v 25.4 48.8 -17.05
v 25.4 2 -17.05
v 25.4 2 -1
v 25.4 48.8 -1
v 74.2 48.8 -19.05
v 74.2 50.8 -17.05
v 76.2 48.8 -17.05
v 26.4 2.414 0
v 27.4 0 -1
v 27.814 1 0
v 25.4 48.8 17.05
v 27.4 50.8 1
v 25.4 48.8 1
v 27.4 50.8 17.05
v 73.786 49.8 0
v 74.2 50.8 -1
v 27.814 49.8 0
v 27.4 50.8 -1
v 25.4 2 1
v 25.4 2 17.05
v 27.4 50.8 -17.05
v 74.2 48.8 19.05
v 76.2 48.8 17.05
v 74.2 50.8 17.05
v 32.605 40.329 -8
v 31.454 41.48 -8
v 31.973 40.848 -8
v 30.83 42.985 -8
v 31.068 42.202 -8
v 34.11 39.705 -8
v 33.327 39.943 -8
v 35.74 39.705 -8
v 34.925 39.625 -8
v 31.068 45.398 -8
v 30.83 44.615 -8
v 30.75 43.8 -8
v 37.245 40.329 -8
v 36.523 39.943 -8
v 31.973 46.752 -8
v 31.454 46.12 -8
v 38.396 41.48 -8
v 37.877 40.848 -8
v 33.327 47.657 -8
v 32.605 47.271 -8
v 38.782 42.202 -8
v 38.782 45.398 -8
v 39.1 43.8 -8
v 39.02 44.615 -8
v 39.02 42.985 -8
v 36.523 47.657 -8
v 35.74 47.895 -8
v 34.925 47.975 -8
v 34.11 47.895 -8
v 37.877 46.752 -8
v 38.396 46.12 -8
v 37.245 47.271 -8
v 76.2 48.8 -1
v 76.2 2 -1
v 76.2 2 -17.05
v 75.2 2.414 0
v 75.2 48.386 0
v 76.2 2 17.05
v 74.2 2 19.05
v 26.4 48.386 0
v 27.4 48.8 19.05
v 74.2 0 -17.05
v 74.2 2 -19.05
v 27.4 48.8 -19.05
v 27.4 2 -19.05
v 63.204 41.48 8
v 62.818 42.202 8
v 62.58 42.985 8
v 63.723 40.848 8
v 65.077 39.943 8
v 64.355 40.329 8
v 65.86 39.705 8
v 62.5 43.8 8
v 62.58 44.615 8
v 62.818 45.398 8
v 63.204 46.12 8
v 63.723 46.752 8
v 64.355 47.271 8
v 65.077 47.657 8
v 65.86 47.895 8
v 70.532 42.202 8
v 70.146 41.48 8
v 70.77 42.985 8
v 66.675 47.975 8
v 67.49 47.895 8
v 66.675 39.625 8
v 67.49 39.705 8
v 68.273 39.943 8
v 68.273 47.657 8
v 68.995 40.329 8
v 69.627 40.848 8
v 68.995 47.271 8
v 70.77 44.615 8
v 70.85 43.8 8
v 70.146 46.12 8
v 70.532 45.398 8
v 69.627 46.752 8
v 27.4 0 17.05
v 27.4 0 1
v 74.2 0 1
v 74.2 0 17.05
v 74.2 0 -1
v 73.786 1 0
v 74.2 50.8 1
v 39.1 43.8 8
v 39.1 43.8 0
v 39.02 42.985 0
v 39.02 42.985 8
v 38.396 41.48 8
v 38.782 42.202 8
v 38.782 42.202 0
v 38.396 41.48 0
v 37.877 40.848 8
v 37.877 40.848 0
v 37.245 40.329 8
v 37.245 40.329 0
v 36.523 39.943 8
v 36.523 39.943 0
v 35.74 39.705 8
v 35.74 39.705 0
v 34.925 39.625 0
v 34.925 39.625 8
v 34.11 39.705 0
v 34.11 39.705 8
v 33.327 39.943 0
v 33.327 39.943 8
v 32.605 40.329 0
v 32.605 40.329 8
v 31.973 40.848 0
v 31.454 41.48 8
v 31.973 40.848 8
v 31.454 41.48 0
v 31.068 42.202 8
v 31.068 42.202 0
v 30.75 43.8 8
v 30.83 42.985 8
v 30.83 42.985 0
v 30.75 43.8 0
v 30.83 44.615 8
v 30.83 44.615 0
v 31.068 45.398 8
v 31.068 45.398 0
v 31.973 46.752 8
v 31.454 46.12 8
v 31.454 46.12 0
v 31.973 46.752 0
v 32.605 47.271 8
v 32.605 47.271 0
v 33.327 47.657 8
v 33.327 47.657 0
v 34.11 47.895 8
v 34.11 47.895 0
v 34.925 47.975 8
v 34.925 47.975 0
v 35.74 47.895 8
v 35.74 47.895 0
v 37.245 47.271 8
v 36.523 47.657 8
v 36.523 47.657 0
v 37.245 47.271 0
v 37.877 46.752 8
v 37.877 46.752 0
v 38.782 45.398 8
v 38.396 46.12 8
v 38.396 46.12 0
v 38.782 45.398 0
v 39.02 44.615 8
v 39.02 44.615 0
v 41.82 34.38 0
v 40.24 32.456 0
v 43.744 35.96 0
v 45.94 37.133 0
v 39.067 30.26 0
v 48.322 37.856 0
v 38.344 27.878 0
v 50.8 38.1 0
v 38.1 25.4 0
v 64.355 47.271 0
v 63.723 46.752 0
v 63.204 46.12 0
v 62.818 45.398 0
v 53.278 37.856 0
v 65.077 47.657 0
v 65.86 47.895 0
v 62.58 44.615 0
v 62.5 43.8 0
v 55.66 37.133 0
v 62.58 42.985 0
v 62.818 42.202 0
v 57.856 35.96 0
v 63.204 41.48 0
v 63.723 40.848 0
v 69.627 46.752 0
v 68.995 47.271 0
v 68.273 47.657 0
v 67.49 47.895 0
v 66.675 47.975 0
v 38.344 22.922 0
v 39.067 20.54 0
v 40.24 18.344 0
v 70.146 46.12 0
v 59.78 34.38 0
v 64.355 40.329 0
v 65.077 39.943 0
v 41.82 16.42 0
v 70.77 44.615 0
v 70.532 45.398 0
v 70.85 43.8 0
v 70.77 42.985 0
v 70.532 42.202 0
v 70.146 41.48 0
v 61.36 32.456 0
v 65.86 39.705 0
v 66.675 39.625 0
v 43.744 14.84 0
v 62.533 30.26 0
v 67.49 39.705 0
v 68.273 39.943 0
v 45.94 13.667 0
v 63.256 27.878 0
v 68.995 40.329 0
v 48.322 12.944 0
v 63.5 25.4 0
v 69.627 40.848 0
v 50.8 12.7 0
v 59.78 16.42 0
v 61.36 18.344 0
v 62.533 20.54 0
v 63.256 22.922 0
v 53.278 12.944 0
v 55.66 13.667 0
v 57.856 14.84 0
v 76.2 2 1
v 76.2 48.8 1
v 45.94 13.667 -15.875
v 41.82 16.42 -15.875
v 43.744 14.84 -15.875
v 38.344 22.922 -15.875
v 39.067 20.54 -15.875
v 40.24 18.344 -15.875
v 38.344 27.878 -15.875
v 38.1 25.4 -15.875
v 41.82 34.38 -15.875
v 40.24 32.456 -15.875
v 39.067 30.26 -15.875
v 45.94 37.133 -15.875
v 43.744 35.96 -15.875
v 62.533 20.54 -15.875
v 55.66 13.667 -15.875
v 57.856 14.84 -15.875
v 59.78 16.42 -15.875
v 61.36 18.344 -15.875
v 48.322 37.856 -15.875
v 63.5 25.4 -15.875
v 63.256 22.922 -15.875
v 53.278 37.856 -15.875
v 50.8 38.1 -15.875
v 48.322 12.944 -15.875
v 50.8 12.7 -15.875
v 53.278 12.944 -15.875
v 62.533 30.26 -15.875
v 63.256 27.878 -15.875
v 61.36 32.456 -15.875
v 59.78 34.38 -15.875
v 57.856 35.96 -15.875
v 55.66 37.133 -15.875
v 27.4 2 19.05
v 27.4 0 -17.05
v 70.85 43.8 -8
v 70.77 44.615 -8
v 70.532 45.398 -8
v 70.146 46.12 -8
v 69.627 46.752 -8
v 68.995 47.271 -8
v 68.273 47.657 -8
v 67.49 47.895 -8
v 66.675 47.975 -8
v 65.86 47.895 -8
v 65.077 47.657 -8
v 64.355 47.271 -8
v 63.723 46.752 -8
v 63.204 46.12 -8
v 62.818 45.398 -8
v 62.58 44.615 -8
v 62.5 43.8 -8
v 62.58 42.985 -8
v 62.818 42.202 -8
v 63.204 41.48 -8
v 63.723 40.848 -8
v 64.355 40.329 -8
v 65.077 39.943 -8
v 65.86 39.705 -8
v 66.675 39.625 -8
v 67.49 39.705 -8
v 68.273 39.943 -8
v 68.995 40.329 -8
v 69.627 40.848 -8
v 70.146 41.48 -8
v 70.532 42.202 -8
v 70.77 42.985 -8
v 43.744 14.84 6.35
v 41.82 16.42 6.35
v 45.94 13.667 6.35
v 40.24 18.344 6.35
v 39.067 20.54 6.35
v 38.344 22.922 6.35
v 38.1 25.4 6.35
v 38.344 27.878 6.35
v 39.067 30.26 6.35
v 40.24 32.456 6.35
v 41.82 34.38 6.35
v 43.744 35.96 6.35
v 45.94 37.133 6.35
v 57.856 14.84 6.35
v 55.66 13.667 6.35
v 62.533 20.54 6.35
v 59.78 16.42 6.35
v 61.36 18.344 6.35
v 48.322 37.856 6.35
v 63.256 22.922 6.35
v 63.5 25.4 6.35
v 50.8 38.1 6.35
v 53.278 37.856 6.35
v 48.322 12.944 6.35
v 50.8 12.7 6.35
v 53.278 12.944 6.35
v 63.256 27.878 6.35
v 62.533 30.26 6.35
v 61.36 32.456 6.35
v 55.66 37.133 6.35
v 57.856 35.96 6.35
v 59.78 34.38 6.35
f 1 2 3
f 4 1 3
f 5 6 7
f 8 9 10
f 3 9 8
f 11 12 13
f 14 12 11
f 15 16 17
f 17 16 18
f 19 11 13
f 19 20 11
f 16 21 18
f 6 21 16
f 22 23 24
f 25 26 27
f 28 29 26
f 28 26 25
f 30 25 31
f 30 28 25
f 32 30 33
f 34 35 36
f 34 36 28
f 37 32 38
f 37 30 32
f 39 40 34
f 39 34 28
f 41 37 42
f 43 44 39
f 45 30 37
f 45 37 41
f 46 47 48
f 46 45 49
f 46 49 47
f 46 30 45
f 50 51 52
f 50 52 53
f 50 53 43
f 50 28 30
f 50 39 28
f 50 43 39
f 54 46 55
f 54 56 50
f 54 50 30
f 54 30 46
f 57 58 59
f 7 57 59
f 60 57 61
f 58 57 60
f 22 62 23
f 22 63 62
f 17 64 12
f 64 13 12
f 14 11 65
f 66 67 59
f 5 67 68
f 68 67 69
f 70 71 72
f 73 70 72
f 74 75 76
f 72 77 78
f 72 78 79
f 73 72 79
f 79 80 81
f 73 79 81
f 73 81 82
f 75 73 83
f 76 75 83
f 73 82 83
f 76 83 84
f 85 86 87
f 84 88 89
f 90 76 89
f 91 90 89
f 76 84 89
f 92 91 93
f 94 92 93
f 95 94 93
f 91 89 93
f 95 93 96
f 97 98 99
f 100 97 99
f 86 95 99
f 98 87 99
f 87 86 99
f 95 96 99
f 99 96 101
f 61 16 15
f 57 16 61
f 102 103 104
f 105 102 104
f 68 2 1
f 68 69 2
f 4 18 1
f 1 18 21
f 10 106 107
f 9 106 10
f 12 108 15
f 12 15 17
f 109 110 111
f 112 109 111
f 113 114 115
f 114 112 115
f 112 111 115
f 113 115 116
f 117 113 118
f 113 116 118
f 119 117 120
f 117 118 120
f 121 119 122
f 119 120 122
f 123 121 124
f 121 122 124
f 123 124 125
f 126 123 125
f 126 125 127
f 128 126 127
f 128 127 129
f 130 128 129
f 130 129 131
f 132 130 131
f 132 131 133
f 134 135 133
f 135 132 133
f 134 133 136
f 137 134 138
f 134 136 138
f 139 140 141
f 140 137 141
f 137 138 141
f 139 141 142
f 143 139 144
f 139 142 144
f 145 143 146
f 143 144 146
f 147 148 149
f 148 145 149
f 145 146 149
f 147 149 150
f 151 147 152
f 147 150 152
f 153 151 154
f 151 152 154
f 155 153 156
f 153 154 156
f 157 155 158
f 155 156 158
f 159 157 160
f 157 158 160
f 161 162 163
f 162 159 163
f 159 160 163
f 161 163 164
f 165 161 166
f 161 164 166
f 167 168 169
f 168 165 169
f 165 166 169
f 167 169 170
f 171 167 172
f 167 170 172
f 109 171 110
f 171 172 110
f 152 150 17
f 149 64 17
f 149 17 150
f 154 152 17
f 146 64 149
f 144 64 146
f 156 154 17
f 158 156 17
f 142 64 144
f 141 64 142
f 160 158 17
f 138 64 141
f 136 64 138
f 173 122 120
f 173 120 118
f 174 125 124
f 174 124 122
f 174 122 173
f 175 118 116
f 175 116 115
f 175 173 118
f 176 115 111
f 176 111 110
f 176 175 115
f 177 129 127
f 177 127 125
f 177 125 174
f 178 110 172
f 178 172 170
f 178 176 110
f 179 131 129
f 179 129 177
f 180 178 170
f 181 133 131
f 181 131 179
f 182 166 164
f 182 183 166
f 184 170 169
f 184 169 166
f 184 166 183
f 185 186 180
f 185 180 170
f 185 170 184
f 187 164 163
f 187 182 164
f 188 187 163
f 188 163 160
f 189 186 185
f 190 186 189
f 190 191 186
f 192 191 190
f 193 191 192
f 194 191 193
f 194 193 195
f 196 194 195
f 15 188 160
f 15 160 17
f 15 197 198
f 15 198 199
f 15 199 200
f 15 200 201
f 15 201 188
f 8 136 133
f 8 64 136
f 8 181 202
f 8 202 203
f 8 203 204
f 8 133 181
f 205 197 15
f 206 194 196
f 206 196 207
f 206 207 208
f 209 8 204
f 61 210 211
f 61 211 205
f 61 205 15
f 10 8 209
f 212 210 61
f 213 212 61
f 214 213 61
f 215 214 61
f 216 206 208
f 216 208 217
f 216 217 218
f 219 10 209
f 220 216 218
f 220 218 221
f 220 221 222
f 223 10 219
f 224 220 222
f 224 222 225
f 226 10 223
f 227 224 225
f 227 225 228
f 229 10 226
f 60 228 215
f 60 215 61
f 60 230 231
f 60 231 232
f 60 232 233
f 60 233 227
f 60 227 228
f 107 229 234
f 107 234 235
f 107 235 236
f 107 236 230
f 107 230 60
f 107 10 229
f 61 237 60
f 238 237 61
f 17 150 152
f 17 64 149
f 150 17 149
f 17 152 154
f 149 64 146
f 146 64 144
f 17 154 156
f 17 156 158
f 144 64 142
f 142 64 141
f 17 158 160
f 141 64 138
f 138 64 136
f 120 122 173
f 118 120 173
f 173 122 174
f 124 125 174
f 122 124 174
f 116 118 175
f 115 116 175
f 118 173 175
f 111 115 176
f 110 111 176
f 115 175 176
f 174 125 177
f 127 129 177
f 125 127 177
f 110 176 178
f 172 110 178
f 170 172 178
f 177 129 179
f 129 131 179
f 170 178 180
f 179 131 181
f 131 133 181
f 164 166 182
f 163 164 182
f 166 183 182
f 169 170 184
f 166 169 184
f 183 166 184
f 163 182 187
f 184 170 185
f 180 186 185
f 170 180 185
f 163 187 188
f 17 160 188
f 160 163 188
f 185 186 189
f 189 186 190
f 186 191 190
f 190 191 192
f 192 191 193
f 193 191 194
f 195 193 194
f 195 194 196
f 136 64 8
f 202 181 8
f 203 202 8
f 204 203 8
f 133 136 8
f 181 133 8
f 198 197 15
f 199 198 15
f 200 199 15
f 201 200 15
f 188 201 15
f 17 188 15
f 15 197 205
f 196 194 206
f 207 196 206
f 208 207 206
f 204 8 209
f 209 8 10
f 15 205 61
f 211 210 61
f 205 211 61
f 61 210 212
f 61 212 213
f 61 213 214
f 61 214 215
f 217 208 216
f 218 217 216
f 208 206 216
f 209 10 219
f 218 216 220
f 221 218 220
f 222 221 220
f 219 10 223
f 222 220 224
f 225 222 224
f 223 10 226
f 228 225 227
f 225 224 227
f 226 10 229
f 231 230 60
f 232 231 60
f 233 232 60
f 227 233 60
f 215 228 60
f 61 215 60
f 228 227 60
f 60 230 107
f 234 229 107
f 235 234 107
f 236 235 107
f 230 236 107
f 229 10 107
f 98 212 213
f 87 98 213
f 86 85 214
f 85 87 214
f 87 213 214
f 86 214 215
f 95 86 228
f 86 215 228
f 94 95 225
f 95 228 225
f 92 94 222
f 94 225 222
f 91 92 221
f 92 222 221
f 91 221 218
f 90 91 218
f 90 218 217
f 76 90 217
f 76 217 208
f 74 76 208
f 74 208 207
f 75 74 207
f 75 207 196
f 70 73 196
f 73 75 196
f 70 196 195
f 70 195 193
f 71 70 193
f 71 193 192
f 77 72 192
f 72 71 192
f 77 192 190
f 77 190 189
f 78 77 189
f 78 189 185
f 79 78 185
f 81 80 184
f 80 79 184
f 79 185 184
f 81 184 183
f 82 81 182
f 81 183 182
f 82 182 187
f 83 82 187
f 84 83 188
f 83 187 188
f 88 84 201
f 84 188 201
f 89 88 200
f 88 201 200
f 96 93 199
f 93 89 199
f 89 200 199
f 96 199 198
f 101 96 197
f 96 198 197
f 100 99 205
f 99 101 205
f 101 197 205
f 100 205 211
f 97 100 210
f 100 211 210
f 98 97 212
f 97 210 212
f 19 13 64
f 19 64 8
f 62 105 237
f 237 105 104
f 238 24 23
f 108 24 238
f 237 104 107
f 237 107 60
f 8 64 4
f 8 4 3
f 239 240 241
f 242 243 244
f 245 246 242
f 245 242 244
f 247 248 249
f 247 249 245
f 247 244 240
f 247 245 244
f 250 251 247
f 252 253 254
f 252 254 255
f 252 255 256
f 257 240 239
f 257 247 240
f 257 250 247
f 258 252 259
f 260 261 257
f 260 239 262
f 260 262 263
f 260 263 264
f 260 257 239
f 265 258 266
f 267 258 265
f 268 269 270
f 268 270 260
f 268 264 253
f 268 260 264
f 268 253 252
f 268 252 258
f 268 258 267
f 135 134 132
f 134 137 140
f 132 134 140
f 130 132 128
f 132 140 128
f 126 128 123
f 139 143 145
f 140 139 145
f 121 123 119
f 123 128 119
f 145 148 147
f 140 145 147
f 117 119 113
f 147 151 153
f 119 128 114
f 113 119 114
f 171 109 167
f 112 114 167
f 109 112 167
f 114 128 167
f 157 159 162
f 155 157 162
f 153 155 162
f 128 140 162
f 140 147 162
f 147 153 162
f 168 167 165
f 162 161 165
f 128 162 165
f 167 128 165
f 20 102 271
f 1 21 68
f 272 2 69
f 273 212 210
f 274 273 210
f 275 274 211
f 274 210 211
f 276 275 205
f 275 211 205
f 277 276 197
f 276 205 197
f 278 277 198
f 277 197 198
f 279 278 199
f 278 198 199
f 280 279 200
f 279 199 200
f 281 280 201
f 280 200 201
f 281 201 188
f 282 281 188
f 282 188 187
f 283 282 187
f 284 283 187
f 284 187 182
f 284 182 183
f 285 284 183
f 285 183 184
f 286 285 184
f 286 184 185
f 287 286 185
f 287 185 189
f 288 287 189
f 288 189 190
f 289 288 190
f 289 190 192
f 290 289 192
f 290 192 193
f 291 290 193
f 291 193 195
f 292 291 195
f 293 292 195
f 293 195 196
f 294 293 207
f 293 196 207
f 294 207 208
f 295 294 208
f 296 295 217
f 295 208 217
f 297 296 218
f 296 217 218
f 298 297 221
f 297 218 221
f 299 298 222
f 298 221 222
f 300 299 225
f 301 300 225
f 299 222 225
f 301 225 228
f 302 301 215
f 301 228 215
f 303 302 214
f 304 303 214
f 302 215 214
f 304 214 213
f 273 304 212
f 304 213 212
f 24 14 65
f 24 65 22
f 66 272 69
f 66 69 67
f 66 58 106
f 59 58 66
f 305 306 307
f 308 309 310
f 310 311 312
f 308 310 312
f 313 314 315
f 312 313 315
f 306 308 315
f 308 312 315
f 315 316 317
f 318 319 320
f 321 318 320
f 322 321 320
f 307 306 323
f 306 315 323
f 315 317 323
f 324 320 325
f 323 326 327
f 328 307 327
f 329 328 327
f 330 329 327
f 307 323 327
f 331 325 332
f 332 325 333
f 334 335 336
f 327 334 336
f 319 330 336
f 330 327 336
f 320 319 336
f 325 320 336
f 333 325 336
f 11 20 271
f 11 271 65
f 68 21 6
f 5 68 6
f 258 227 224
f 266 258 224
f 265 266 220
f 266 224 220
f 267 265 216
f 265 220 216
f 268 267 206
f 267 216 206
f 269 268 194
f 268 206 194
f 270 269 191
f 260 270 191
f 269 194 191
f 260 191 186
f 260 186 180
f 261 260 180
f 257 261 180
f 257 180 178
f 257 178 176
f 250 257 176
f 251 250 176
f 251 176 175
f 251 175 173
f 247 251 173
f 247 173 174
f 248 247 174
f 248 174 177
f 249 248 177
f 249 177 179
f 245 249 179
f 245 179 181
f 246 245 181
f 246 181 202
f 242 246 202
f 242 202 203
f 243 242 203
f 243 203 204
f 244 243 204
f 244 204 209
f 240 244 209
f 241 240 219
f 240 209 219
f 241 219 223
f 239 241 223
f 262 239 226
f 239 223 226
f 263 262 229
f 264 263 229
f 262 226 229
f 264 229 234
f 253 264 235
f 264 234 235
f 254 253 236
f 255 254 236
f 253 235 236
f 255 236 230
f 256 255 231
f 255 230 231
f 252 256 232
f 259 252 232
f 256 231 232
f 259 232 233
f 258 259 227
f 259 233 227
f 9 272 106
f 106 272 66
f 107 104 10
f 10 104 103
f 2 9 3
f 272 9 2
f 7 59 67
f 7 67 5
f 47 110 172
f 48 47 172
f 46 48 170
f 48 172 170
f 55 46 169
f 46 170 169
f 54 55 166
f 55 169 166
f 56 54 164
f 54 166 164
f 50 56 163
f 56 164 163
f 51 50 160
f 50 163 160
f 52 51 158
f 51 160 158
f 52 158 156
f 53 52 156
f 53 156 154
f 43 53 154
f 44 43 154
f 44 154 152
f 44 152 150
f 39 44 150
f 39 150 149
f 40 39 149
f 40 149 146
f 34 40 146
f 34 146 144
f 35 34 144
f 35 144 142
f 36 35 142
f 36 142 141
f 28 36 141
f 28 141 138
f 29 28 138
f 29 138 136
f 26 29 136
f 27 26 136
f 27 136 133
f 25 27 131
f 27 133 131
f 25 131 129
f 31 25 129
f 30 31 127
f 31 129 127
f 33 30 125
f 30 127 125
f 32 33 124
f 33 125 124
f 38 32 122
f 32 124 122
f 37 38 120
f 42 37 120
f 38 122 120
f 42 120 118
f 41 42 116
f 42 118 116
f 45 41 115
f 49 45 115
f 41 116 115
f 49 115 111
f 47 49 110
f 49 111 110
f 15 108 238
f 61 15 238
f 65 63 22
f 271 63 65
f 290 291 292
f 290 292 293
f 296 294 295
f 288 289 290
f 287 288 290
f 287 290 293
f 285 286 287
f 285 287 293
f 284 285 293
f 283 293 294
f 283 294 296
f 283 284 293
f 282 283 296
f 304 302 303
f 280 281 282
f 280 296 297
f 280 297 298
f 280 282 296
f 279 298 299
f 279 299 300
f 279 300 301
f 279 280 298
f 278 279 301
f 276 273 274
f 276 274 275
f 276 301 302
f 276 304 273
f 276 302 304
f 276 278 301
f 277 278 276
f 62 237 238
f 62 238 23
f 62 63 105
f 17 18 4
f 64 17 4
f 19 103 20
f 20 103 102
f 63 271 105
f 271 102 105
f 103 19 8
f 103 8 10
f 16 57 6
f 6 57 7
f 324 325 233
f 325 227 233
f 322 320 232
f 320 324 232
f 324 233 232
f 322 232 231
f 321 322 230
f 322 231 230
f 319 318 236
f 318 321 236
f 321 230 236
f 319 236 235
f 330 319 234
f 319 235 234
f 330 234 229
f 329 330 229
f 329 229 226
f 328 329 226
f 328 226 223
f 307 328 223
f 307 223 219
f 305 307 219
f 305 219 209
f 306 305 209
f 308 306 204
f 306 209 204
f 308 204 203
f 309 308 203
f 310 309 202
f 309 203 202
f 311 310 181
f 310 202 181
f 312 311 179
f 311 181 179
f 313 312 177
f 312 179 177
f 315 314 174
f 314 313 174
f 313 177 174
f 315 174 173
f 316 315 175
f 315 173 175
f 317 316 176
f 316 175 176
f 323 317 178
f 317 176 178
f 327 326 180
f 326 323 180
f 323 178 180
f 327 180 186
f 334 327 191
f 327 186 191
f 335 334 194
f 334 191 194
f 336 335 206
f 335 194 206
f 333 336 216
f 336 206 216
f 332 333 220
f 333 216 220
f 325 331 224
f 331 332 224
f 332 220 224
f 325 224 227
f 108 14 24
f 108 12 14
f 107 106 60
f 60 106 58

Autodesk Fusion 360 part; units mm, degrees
ref_plane "WorkPlane1" through (0, 0, 0) normal (0, 0, 1) x (1, 0, 0)
ref_plane "WorkPlane1" through (0, 0, 0) normal (0, 1, 0) x (0, 0, 1) in component "RingBox_Bottom"
sketch "RB_Bottom" plane through (0, 0, 0) normal (0, 1, 0) x (1, 0, 0) in component "RingBox_Bottom"
  line L0 (25.4, 0) -> (76.2, 0)
  line L1 (76.2, 0) -> (76.2, 19.05)
  line L2 (76.2, 19.05) -> (25.4, 19.05)
  line L3 (25.4, 19.05) -> (25.4, 0)
  point P0 (25.4, 0)
  dimension "Z_RB_Bottom_Orig" = 0
  dimension "X_RB_Bottom_Orig" = 25.4
  dimension "RB_Bottom_Thickness" = 19.05
  dimension "RB_Bottom_Width" = 50.8
extrude "Extrude1" add sketch "RB_Bottom" along normal blind 50.8 makes body 1 in component "RingBox_Bottom"
ref_plane "WorkPlane1" through (0, 0, 0) normal (0, 1, 0) x (0, 0, 1) in component "RingBox_Top"
sketch "Sketch1" plane through (0, 0, 0) normal (0, 1, 0) x (1, 0, 0) in component "RingBox_Top"
  line L0 (25.4, 0) -> (76.2, 0)
  line L1 (76.2, 0) -> (76.2, -19.05)
  line L2 (76.2, -19.05) -> (25.4, -19.05)
  line L3 (25.4, -19.05) -> (25.4, 0)
  point P0 (25.4, 0)
  dimension "Z_RB_Top_Orig" = 0
  dimension "X_RB_Top_Orig" = 25.4
  dimension "RB_Top_Width" = 50.8
  dimension "RB_Top_Thickness" = 19.05
extrude "Extrude1'" add sketch "Sketch1" along normal blind 50.8 separate body makes body 2 in component "RingBox_Top"
ref_plane "WorkPlane2" through (0, 0, 0) normal (0, 0, 1) x (1, 0, 0) in component "RingBox_Bottom"
sketch "RBB_Holes" plane through (0, 0, 0) normal (0, 0, 1) x (1, 0, 0) in component "RingBox_Bottom"
  circle A0 centre (50.8, 25.4) radius 12.7
  line L0 (25.4, 50.8) -> (76.2, 50.8)
  line L1 (25.4, 0) -> (25.4, 50.8)
  circle A1 centre (34.925, 43.8) radius 4.175
  circle A2 centre (66.675, 43.8) radius 4.175
  point P0 (50.8, 25.4)
  point P1 (34.925, 43.8)
  point P2 (66.675, 43.8)
  dimension "Y_RBB_Holes_Orig" = -25.4
  dimension "X_RBB_Holes_Orig" = 50.8
  dimension "RBBH_Ring_Diameter" = 25.4
  dimension "Hinge1_Y_Offset" = 18.4
  dimension "RBB_DistanceBTWParts1" = 15.875
  dimension "Hinge2_Y_Offset" = 18.4
  dimension "RBB_DistanceBTWParts2" = 15.875
  dimension "RBBH_Barrel1_Diameter" = 8.35
  dimension "RBBH_Barrel2_Diameter" = 8.35
extrude "Extrude2" cut sketch "RBB_Holes" along normal mid plane 16 contours A1 | A2 bodies 1 in component "RingBox_Bottom"
chamfer "Chamfer1" distance 2 angle 45 8 edges at (76.2, 50.8, -9.525) (25.4, 50.8, -9.525) (25.4, 0, -9.525) (50.8, 50.8, -19.05) (25.4, 25.4, -19.05) (50.8, 0, -19.05) (76.2, 25.4, -19.05) (76.2, 0, -9.525) on bodies 1 in component "RingBox_Bottom"
chamfer "Chamfer1'" distance 2 angle 45 8 edges at (76.2, 25.4, 19.05) (50.8, 0, 19.05) (76.2, 0, 9.525) (76.2, 50.8, 9.525) (25.4, 50.8, 9.525) (25.4, 0, 9.525) (25.4, 25.4, 19.05) (50.8, 50.8, 19.05) on bodies 2 in component "RingBox_Top"
chamfer "Chamfer2" distance 1 angle 45 8 edges at (25.4, 25.4, 0) (50.8, 0, 0) (76.2, 25.4, 0) (50.8, 50.8, 0) (75.2, 49.8, 0) (26.4, 49.8, 0) (26.4, 1, 0) (75.2, 1, 0) on bodies 1 in component "RingBox_Bottom"
chamfer "Chamfer2'" distance 1 angle 45 8 edges at (25.4, 25.4, 0) (26.4, 49.8, 0) (50.8, 50.8, 0) (75.2, 49.8, 0) (76.2, 25.4, 0) (75.2, 1, 0) (26.4, 1, 0) (50.8, 0, 0) on bodies 2 in component "RingBox_Top"
extrude "Extrude2'" cut sketch "RBB_Holes" along normal blind 8 contours A1 | A2 bodies 2 in component "RingBox_Top"
extrude "Extrude3" cut sketch "RBB_Holes" against normal blind 15.875 contours A0 bodies 1 in component "RingBox_Bottom"
extrude "Extrude3'" cut sketch "RBB_Holes" along normal blind 6.35 contours A0 bodies 2 in component "RingBox_Top"
component "RingBox_Top" placed x (1, 0, 0) y (0, 1, 0) z (0, 0, 1) at (0, 0, 0)
component "RingBox_Bottom" placed x (1, 0, 0) y (0, 1, 0) z (0, 0, 1) at (0, 0, 0)
equation "Shared_Kerf = 0.125 in"
equation "Z_RingBox_Orig = 0 in"
equation "Shared_Material_Thickness = 2 in"
equation "Y_RB_Bottom_Orig = 0 in"
equation "RB_Bottom_Thickness = Shared_Total_Height / 2"
equation "RB_Bottom_Width = Shared_Material_Thickness"
equation "RB_Bottom_Length = Shared_Material_Thickness"
equation "Y_RB_Top_Orig = Y_RB_Bottom_Orig"
equation "RB_Top_Width = Shared_Material_Thickness"
equation "RB_Top_Thickness = Shared_Total_Height / 2" comment "make sure to incude kerf when cutting stock"
equation "RB_Top_Length = Shared_Material_Thickness"
equation "Z_RBB_Holes_Orig = Z_RB_Bottom_Orig"
equation "Y_RBB_Holes_Orig = -( Y_RB_Bottom_Orig + ( RB_Bottom_Length / 2 ) )"
equation "X_RBB_Holes_Orig = X_RB_Bottom_Orig + ( RB_Bottom_Width / 2 )"
equation "Hinge_Y_Offset = 7 mm"
equation "Hinge1_Y_Offset = ( RB_Bottom_Length / 2 ) - Hinge_Y_Offset"
equation "Hinge_DistBTWParts = 1.25 in"
equation "RBB_DistanceBTWParts1 = Hinge_DistBTWParts / 2"
equation "Hinge2_Y_Offset = ( RB_Bottom_Length / 2 ) - Hinge_Y_Offset"
equation "RBB_DistanceBTWParts2 = Hinge_DistBTWParts / 2"
equation "RBBH_Barrel1_Diameter = Shared_Barrel_Diameter"
equation "RBBH_Barrel2_Diameter = Shared_Barrel_Diameter"
equation "Shared_Barrel_Diameter = 8.35 mm"
equation "RBH_Hinge_Depth = Shared_Hinge_Depth"
equation "External_Chamfer = 2 mm"
equation "Internal_Chamfer = 1 mm"
equation "RTH_Hinge_Depth = Shared_Hinge_Depth"
equation "RBBH_Ring_Depth = -( RB_Bottom_Thickness - 0.125 in )"
equation "RBTH_Ring_Depth = 0.25 in"
equation "Shared_Total_Height = 1.5 in"
equation "Shared_Hinge_Depth = 8 mm"
